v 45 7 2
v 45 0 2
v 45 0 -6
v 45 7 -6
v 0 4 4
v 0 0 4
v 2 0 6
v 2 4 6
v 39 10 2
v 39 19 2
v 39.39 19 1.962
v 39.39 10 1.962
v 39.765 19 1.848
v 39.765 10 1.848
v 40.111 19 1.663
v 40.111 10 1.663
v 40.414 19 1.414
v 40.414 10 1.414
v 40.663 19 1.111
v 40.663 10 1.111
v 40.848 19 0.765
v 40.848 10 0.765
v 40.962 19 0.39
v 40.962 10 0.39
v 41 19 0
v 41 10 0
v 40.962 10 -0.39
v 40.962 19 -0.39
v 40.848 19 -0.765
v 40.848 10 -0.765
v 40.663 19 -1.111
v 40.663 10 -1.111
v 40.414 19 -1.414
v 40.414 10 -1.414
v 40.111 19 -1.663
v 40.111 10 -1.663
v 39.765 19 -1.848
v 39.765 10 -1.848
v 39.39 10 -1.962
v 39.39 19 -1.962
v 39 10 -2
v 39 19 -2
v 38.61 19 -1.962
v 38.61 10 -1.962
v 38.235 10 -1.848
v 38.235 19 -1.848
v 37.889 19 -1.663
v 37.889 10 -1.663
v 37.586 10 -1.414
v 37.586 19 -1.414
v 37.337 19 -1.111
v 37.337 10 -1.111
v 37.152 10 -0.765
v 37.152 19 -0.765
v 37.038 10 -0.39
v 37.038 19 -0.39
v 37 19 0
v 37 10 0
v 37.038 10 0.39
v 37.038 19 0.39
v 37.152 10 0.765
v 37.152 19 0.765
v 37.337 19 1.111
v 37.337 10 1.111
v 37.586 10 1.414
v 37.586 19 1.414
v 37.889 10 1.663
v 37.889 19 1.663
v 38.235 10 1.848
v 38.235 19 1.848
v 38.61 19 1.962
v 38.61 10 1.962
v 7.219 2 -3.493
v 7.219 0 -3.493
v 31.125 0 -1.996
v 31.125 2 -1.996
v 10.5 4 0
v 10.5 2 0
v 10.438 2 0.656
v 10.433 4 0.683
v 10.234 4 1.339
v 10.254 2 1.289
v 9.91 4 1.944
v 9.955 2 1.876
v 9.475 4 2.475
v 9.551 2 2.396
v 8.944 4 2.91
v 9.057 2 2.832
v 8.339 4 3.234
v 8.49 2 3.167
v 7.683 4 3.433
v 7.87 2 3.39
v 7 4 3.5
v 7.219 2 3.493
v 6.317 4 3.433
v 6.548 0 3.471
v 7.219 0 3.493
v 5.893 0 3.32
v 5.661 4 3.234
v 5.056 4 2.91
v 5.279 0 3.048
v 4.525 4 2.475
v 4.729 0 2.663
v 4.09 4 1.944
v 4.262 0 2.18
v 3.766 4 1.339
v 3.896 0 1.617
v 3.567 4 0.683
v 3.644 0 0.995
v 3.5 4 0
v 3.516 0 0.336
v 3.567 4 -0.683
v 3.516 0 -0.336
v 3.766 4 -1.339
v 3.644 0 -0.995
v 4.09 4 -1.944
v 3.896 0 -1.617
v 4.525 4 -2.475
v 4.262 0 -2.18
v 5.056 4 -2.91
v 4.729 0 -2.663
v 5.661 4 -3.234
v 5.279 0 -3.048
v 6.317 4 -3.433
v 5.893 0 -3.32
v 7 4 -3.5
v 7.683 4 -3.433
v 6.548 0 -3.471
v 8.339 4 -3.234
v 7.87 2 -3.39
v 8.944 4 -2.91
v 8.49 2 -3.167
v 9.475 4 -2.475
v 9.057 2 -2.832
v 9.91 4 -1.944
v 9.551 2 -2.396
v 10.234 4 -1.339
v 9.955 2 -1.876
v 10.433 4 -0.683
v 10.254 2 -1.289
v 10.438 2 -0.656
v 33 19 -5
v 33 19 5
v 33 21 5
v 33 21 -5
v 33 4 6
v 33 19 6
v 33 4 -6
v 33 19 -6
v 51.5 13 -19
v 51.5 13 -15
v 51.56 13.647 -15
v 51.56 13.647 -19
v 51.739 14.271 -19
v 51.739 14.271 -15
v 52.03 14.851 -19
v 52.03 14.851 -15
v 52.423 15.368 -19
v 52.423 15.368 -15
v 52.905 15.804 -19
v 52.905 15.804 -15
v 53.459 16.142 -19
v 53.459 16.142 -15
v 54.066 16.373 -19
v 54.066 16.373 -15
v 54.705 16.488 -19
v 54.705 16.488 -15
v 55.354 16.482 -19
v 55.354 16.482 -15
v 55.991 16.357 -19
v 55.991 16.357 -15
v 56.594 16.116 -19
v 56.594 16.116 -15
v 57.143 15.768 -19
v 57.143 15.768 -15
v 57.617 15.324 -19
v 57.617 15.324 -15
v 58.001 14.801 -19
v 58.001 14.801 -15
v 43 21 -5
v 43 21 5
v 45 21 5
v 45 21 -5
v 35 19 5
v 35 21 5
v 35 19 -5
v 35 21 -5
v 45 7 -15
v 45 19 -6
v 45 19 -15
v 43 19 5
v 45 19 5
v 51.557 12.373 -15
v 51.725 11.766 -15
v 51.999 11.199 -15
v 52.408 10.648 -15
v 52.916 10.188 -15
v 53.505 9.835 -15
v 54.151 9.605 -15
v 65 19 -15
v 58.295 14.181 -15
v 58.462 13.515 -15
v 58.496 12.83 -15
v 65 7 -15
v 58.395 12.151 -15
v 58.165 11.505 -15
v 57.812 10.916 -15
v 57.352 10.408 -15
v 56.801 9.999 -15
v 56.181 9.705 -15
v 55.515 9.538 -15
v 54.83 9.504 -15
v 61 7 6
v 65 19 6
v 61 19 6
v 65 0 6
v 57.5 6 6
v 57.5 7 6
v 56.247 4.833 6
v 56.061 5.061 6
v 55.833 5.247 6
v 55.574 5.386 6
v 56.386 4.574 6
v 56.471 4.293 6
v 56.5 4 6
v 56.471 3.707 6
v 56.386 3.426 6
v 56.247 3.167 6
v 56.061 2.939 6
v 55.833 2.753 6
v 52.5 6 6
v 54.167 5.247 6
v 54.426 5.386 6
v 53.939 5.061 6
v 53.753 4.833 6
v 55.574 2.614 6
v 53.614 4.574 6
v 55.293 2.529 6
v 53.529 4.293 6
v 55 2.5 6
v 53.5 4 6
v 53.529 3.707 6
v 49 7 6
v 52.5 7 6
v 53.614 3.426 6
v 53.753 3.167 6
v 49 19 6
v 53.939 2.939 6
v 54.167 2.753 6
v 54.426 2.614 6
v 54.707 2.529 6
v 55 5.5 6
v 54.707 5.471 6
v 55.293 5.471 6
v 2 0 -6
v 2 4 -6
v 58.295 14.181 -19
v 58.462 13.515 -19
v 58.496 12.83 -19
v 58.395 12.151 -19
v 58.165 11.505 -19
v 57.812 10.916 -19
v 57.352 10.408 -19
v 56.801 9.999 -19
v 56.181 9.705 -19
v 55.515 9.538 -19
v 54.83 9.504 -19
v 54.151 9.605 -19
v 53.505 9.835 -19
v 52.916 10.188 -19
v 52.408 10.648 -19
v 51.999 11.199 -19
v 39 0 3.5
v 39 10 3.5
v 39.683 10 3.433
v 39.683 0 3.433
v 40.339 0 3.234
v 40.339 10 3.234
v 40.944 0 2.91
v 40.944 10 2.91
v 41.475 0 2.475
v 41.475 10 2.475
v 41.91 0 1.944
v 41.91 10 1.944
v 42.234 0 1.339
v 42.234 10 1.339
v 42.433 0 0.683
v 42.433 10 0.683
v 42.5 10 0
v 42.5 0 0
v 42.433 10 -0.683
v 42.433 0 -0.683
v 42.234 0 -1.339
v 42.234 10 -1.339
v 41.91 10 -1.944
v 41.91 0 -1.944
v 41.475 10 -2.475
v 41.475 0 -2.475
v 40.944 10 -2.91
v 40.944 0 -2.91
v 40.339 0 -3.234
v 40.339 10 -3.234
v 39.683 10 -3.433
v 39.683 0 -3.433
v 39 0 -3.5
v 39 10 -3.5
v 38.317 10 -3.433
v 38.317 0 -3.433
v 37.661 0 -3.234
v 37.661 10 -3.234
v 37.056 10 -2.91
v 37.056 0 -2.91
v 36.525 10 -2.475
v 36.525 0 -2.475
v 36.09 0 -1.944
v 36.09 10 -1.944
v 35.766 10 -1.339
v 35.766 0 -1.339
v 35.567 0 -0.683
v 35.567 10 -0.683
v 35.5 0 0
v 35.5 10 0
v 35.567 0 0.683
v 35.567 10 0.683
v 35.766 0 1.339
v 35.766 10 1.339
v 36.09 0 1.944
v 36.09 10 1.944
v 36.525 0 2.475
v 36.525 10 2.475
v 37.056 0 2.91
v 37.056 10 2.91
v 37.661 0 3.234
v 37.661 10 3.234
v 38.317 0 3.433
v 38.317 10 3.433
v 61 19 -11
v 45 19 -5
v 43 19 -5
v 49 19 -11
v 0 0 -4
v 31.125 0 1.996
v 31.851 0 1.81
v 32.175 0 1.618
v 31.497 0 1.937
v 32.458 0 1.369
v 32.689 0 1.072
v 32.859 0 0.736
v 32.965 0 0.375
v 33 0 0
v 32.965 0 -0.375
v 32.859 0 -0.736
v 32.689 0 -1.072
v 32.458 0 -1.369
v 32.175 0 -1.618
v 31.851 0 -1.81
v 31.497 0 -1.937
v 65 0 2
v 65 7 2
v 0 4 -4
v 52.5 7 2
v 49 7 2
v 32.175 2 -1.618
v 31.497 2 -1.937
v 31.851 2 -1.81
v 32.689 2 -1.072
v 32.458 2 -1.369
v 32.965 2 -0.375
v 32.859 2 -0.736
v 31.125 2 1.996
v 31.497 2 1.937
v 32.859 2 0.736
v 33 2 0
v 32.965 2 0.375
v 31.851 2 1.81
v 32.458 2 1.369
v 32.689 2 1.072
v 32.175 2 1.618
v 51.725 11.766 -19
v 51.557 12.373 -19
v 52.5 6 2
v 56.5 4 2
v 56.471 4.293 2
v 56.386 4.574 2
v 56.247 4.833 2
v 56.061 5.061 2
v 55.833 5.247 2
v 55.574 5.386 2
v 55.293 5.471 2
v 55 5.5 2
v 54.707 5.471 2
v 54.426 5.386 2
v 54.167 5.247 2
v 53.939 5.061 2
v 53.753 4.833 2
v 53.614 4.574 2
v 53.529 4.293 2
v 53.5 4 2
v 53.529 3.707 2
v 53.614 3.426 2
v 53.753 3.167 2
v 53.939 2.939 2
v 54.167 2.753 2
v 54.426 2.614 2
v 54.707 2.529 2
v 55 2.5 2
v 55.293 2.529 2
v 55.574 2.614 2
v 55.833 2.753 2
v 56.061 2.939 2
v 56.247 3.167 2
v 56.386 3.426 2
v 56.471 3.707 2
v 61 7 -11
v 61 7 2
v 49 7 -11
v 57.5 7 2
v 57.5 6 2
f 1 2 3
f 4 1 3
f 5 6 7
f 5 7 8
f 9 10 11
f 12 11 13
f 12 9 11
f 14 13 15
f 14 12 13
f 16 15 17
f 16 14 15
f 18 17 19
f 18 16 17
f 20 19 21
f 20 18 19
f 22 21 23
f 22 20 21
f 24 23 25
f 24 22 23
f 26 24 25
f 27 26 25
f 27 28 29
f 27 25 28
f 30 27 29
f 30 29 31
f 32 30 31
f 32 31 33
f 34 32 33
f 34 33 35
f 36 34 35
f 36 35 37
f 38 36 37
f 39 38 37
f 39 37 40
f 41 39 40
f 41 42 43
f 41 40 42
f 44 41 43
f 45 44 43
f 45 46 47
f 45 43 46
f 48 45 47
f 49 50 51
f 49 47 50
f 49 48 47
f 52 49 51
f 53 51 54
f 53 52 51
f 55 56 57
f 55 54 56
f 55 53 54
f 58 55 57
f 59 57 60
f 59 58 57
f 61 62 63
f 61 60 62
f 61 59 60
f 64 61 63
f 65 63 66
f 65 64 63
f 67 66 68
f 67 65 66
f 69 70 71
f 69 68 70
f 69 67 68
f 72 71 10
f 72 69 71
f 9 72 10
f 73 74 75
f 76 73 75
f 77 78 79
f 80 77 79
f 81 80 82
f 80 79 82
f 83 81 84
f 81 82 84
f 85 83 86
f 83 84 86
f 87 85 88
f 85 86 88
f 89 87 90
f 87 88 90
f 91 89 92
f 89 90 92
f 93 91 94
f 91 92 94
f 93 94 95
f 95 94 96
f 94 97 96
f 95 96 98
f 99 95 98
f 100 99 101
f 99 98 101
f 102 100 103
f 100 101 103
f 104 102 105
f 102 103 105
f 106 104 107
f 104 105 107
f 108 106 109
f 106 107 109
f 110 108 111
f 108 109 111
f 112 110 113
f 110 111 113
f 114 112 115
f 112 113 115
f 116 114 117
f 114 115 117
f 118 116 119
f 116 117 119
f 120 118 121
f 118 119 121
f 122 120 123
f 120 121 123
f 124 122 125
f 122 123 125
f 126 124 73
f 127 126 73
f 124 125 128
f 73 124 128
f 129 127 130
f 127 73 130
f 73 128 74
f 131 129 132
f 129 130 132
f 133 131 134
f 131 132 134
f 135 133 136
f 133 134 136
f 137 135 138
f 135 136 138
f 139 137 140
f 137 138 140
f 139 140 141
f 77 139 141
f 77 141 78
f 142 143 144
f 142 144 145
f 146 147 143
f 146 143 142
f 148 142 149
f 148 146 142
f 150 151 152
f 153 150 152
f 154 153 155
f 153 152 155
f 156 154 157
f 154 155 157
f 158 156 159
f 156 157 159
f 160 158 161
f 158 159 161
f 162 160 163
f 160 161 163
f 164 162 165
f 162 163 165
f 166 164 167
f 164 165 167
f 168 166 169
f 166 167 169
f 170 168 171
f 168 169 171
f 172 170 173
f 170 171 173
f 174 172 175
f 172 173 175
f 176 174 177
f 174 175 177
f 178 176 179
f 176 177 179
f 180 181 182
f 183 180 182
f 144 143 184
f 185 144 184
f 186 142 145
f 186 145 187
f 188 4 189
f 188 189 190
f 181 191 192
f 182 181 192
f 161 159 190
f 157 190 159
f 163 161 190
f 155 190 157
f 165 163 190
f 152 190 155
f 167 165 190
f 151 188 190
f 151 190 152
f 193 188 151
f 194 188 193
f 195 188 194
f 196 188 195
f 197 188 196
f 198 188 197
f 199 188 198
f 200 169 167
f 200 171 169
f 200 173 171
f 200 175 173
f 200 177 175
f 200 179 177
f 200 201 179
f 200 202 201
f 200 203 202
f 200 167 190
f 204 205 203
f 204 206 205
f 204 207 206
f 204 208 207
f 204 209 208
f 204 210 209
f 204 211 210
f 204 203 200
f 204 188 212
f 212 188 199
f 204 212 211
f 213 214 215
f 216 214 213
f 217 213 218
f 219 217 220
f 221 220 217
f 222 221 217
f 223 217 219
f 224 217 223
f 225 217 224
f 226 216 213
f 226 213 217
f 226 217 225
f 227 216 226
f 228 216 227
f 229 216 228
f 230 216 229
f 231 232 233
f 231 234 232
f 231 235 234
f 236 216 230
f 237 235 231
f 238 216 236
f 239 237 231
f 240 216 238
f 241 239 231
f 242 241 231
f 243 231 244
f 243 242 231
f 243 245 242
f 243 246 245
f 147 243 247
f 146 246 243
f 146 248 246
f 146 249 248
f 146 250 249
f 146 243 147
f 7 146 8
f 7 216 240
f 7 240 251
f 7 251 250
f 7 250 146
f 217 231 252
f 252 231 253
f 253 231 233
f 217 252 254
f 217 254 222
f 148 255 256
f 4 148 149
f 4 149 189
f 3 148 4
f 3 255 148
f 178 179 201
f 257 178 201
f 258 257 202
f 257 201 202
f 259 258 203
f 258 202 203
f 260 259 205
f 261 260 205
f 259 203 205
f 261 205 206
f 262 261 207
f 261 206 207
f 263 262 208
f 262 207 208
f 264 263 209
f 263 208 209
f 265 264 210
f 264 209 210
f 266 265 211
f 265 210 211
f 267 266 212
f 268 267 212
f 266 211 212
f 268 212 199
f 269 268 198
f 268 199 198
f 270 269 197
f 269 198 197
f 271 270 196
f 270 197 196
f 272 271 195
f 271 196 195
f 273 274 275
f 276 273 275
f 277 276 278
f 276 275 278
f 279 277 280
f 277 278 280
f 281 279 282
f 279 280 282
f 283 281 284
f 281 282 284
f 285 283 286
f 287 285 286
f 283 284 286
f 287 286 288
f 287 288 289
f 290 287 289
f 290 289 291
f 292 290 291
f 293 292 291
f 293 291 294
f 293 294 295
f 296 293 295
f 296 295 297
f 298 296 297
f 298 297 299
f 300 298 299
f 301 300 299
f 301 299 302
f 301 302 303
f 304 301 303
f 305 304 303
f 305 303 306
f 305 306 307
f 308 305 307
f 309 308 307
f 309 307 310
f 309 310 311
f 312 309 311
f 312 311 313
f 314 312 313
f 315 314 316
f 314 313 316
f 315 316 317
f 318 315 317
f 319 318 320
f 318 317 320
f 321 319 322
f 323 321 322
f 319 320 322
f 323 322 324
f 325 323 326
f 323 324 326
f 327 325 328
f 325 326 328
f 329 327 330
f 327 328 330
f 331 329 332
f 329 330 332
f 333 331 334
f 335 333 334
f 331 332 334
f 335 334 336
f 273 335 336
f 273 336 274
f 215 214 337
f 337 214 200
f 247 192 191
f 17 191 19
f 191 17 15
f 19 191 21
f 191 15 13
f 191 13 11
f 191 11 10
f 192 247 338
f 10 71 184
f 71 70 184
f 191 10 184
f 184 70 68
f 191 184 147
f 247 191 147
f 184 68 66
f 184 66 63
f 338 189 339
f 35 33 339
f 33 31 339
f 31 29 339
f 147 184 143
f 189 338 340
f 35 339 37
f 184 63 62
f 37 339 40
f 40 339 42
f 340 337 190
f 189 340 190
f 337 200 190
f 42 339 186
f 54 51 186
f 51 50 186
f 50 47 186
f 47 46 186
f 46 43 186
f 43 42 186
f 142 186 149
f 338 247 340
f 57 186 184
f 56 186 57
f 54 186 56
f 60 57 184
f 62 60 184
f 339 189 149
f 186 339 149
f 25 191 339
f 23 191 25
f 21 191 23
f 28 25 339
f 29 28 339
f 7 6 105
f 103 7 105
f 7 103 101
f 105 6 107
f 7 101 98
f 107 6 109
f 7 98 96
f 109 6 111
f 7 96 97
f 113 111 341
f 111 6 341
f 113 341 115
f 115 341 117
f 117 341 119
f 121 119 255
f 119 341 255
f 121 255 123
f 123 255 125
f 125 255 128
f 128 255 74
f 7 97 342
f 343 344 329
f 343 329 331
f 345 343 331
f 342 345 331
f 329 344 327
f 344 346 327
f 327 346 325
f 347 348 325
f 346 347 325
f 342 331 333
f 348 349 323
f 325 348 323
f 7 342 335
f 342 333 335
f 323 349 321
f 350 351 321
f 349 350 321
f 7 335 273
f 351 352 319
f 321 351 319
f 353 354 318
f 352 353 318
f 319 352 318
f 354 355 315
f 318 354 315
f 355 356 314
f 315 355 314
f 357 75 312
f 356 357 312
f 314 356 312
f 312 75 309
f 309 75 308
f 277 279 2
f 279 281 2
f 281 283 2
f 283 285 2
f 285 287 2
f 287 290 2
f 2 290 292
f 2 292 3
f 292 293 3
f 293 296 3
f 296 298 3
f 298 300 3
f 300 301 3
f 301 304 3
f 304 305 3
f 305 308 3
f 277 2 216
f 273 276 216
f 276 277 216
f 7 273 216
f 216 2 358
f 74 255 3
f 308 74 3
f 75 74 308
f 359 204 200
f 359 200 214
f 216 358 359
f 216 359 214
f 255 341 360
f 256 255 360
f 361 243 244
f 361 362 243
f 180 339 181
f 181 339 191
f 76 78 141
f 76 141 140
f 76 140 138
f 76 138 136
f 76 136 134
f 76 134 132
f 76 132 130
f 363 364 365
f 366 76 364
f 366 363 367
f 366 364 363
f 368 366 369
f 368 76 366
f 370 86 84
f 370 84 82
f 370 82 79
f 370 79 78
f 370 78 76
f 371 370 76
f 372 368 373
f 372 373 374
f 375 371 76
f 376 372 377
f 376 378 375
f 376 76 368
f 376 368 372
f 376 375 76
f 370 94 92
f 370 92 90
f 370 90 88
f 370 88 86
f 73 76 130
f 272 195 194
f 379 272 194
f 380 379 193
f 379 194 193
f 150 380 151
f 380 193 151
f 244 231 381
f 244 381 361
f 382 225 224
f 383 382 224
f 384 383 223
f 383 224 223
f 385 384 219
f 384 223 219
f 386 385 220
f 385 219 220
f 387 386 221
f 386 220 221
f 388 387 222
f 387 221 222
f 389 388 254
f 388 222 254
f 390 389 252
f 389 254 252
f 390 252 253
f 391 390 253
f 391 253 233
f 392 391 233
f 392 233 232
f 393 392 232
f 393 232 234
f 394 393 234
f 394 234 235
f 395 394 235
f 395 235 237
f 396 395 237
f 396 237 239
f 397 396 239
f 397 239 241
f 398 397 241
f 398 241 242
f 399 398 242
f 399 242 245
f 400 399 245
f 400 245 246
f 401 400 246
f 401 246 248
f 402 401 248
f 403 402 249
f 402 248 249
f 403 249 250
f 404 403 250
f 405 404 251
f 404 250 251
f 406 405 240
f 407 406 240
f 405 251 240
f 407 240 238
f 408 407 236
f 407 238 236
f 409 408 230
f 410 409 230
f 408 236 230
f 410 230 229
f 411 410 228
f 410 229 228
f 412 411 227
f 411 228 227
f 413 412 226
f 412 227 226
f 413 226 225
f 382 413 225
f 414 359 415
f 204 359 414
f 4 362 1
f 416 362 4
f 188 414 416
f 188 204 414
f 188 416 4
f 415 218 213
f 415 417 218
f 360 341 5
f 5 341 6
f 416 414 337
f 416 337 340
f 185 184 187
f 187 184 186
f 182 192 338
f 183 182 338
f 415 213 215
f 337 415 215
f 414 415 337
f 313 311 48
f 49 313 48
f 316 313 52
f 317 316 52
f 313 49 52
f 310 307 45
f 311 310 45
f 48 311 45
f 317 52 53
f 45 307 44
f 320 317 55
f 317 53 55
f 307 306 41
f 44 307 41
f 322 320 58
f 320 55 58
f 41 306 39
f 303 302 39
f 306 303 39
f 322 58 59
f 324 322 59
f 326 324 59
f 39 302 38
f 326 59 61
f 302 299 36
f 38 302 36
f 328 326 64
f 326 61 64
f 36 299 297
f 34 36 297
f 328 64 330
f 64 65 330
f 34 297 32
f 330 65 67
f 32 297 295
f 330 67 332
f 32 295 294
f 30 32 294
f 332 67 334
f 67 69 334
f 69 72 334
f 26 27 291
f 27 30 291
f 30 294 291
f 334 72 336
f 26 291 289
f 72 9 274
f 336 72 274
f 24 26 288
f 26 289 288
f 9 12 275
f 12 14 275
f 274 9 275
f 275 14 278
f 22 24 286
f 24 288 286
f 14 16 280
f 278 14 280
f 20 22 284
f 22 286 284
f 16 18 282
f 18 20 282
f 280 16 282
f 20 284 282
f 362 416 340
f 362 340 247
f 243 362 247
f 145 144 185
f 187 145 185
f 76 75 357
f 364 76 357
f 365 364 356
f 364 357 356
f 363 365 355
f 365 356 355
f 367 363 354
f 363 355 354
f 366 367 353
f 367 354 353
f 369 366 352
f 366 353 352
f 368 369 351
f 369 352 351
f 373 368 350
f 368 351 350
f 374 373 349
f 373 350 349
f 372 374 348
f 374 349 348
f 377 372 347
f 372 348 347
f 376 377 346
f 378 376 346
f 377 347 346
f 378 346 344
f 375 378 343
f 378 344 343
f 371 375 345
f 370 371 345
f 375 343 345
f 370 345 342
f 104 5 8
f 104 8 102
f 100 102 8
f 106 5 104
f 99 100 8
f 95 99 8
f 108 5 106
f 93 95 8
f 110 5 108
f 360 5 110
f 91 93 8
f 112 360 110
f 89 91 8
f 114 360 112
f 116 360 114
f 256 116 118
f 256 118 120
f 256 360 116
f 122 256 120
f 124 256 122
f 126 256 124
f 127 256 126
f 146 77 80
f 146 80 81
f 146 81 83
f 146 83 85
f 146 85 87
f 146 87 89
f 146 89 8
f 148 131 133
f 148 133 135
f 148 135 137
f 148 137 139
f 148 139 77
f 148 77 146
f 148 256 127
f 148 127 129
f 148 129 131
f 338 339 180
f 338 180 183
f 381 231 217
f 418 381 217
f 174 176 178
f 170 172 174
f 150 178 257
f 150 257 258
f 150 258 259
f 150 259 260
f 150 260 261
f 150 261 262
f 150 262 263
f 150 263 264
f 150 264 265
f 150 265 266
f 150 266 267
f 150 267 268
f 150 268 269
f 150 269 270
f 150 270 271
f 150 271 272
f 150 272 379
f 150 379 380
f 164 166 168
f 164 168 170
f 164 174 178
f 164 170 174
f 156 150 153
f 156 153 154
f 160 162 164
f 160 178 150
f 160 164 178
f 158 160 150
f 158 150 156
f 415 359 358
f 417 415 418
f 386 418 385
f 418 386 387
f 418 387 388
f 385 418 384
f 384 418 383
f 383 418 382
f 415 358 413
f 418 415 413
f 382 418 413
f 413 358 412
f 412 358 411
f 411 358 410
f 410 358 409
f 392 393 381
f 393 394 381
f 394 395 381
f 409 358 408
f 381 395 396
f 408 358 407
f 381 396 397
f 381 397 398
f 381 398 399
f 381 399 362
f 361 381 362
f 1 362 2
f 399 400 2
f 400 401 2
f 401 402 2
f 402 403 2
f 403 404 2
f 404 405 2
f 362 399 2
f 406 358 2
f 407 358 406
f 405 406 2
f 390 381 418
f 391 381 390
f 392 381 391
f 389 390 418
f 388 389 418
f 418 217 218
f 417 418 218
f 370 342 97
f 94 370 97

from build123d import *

# Parameters (mm, degrees)
BOSS_EXTRUDE1_DEPTH     = 4
SKETCH1_3_W             = 12
SKETCH1_3_H             = 12
BOSS_EXTRUDE2_DEPTH     = 19
BOSS_EXTRUDE3_DEPTH     = 7
BOSS_EXTRUDE4_START     = 19
SKETCH1_6_W             = 2
SKETCH1_6_H             = 5
BOSS_EXTRUDE4_DEPTH     = 2
BOSS_EXTRUDE5_DEPTH     = 12
BOSS_EXTRUDE6_DEPTH     = 4
SKETCH5_R               = 1.5
SKETCH5_W               = 5
SKETCH5_H               = 1
CUT_EXTRUDE1_DEPTH      = 73.739260376
CUT_EXTRUDE2_DEPTH      = 71.334913094
CUT_EXTRUDE2_DEPTH_BACK = 9
SKETCH6_R               = 2
SKETCH7_R               = 3.5
SKETCH7_R_2             = 2
CUT_EXTRUDE3_DEPTH      = 69.607579756
CUT_EXTRUDE4_DEPTH      = 2
CHAMFER1_SIZE           = 2


with BuildPart() as part:
    # Sketch1 → Boss-Extrude1 (new body)
    with BuildSketch(Plane(origin=(0, 0, 0), x_dir=(1, 0, 0), z_dir=(0, 1, 0))):
        with BuildLine():
            Line((33, 5), (33, 6))
            Line((33, 6), (0, 6))
            Line((0, 6), (0, 0))
            Line((0, 0), (3.5, 0))
            ThreePointArc((3.5, 0), (7, 3.5), (10.5, 0))
            Line((10.5, 0), (33, 0))
            Line((33, 0), (33, 5))
        make_face()
        with BuildLine():
            Line((33, -5), (33, 0))
            Line((33, 0), (10.5, 0))
            ThreePointArc((10.5, 0), (7, -3.5), (3.5, 0))
            Line((3.5, 0), (0, 0))
            Line((0, 0), (0, -6))
            Line((0, -6), (33, -6))
            Line((33, -6), (33, -5))
        make_face()
    extrude(amount=BOSS_EXTRUDE1_DEPTH)

    # Sketch1<3> → Boss-Extrude2 (add)
    with BuildSketch(Plane(origin=(0, 0, 0), x_dir=(1, 0, 0), z_dir=(0, 1, 0))):
        with Locations((39, 0)):
            Rectangle(SKETCH1_3_W, SKETCH1_3_H)
    extrude(amount=BOSS_EXTRUDE2_DEPTH)

    # Sketch1<4> → Boss-Extrude3 (add)
    with BuildSketch(Plane(origin=(0, 0, 0), x_dir=(1, 0, 0), z_dir=(0, 1, 0))):
        Polygon((65, -2), (45, -2), (45, -5), (45, -6), (65, -6), align=None)
    extrude(amount=BOSS_EXTRUDE3_DEPTH)

    # Sketch1<6> → Boss-Extrude4 (add)
    with BuildSketch(Plane(origin=(0, 0, 0), x_dir=(1, 0, 0), z_dir=(0, 1, 0)).offset(BOSS_EXTRUDE4_START)):
        with Locations((34, -2.5)):
            Rectangle(SKETCH1_6_W, SKETCH1_6_H)
        with Locations((34, 2.5)):
            Rectangle(SKETCH1_6_W, SKETCH1_6_H)
        Polygon((45, -2), (45, 0), (43, 0), (43, -5), (45, -5), align=None)
        with Locations((44, 2.5)):
            Rectangle(SKETCH1_6_W, SKETCH1_6_H)
    extrude(amount=BOSS_EXTRUDE4_DEPTH)

    # Sketch2 → Boss-Extrude5 (add)
    with BuildSketch(Plane(origin=(0, 7, 0), x_dir=(1, 0, 0), z_dir=(0, 1, 0))):
        Polygon((45, -6), (45, 15), (65, 15), (65, -6), (61, -6), (61, 11), (49, 11), (49, -6), align=None)
    extrude(amount=BOSS_EXTRUDE5_DEPTH)

    # Sketch4 → Boss-Extrude6 (add)
    with BuildSketch(Plane(origin=(0, 0, -15), x_dir=(-1, 0, 0), z_dir=(0, 0, -1))):
        with BuildLine():
            ThreePointArc((-51.5, 13), (-54.065732463, 16.373002249), (-58.00122524, 14.800735144))
            Line((-58.00122524, 14.800735144), (-51.99877476, 11.199264856))
            ThreePointArc((-51.99877476, 11.199264856), (-51.626997751, 12.065732463), (-51.5, 13))
        make_face()
        with BuildLine():
            Line((-51.99877476, 11.199264856), (-58.00122524, 14.800735144))
            ThreePointArc((-58.00122524, 14.800735144), (-56.800735144, 9.99877476), (-51.99877476, 11.199264856))
        make_face()
    extrude(amount=BOSS_EXTRUDE6_DEPTH)

    # Sketch5 → Cut-Extrude1 (cut, through all)
    with BuildSketch(Plane.XY.offset(6)):
        with Locations((55, 4)):
            Circle(SKETCH5_R)
        with Locations((55, 6.5)):
            Rectangle(SKETCH5_W, SKETCH5_H)
    extrude(amount=-CUT_EXTRUDE1_DEPTH, mode=Mode.SUBTRACT)

    # Sketch6 → Cut-Extrude2 (cut, two sides: drawn at the far end of the back side and taken through both)
    with BuildSketch(Plane(origin=(0, 19, 0), x_dir=(1, 0, 0), z_dir=(0, 1, 0)).offset(-CUT_EXTRUDE2_DEPTH_BACK)):
        with Locations(Location((39, 0, 0), (0, 0, 270))):
            Circle(SKETCH6_R)
    extrude(amount=CUT_EXTRUDE2_DEPTH + CUT_EXTRUDE2_DEPTH_BACK, mode=Mode.SUBTRACT)

    # Sketch7 → Cut-Extrude3 (cut, through all)
    # profile 1 of 2: a face of its own
    with BuildSketch(Plane(origin=(0, 10, 0), x_dir=(1, 0, 0), z_dir=(0, 1, 0))):
        with Locations(Location((39, 0, 0), (0, 0, 270))):
            Circle(SKETCH7_R)
        with Locations(Location((39, 0, 0), (0, 0, 270))):
            Circle(SKETCH7_R_2, mode=Mode.SUBTRACT)
    # profile 2 of 2: a face of its own
    with BuildSketch(Plane(origin=(0, 10, 0), x_dir=(1, 0, 0), z_dir=(0, 1, 0))):
        with Locations(Location((39, 0, 0), (0, 0, 270))):
            Circle(SKETCH7_R_2)
    extrude(amount=-CUT_EXTRUDE3_DEPTH, mode=Mode.SUBTRACT)

    # Sketch8 → Cut-Extrude4 (cut)
    with BuildSketch(Plane.XZ):
        with BuildLine():
            Line((31.125, 1.996089928), (7.21875, 3.493157374))
            ThreePointArc((7.21875, 3.493157374), (9.551041454, 2.396286189), (10.5, 0))
            ThreePointArc((10.5, 0), (9.551041454, -2.396286189), (7.21875, -3.493157374))
            Line((7.21875, -3.493157374), (31.125, -1.996089928))
            ThreePointArc((31.125, -1.996089928), (33, 0), (31.125, 1.996089928))
        make_face()
    extrude(amount=-CUT_EXTRUDE4_DEPTH, mode=Mode.SUBTRACT)

    # Chamfer1
    chamfer1_edges = [part.edges().sort_by_distance(p)[0] for p in [
        (0, 2, -6),
        (0, 2, 6),
    ]]
    chamfer(chamfer1_edges, length=CHAMFER1_SIZE)


solid = part.part
